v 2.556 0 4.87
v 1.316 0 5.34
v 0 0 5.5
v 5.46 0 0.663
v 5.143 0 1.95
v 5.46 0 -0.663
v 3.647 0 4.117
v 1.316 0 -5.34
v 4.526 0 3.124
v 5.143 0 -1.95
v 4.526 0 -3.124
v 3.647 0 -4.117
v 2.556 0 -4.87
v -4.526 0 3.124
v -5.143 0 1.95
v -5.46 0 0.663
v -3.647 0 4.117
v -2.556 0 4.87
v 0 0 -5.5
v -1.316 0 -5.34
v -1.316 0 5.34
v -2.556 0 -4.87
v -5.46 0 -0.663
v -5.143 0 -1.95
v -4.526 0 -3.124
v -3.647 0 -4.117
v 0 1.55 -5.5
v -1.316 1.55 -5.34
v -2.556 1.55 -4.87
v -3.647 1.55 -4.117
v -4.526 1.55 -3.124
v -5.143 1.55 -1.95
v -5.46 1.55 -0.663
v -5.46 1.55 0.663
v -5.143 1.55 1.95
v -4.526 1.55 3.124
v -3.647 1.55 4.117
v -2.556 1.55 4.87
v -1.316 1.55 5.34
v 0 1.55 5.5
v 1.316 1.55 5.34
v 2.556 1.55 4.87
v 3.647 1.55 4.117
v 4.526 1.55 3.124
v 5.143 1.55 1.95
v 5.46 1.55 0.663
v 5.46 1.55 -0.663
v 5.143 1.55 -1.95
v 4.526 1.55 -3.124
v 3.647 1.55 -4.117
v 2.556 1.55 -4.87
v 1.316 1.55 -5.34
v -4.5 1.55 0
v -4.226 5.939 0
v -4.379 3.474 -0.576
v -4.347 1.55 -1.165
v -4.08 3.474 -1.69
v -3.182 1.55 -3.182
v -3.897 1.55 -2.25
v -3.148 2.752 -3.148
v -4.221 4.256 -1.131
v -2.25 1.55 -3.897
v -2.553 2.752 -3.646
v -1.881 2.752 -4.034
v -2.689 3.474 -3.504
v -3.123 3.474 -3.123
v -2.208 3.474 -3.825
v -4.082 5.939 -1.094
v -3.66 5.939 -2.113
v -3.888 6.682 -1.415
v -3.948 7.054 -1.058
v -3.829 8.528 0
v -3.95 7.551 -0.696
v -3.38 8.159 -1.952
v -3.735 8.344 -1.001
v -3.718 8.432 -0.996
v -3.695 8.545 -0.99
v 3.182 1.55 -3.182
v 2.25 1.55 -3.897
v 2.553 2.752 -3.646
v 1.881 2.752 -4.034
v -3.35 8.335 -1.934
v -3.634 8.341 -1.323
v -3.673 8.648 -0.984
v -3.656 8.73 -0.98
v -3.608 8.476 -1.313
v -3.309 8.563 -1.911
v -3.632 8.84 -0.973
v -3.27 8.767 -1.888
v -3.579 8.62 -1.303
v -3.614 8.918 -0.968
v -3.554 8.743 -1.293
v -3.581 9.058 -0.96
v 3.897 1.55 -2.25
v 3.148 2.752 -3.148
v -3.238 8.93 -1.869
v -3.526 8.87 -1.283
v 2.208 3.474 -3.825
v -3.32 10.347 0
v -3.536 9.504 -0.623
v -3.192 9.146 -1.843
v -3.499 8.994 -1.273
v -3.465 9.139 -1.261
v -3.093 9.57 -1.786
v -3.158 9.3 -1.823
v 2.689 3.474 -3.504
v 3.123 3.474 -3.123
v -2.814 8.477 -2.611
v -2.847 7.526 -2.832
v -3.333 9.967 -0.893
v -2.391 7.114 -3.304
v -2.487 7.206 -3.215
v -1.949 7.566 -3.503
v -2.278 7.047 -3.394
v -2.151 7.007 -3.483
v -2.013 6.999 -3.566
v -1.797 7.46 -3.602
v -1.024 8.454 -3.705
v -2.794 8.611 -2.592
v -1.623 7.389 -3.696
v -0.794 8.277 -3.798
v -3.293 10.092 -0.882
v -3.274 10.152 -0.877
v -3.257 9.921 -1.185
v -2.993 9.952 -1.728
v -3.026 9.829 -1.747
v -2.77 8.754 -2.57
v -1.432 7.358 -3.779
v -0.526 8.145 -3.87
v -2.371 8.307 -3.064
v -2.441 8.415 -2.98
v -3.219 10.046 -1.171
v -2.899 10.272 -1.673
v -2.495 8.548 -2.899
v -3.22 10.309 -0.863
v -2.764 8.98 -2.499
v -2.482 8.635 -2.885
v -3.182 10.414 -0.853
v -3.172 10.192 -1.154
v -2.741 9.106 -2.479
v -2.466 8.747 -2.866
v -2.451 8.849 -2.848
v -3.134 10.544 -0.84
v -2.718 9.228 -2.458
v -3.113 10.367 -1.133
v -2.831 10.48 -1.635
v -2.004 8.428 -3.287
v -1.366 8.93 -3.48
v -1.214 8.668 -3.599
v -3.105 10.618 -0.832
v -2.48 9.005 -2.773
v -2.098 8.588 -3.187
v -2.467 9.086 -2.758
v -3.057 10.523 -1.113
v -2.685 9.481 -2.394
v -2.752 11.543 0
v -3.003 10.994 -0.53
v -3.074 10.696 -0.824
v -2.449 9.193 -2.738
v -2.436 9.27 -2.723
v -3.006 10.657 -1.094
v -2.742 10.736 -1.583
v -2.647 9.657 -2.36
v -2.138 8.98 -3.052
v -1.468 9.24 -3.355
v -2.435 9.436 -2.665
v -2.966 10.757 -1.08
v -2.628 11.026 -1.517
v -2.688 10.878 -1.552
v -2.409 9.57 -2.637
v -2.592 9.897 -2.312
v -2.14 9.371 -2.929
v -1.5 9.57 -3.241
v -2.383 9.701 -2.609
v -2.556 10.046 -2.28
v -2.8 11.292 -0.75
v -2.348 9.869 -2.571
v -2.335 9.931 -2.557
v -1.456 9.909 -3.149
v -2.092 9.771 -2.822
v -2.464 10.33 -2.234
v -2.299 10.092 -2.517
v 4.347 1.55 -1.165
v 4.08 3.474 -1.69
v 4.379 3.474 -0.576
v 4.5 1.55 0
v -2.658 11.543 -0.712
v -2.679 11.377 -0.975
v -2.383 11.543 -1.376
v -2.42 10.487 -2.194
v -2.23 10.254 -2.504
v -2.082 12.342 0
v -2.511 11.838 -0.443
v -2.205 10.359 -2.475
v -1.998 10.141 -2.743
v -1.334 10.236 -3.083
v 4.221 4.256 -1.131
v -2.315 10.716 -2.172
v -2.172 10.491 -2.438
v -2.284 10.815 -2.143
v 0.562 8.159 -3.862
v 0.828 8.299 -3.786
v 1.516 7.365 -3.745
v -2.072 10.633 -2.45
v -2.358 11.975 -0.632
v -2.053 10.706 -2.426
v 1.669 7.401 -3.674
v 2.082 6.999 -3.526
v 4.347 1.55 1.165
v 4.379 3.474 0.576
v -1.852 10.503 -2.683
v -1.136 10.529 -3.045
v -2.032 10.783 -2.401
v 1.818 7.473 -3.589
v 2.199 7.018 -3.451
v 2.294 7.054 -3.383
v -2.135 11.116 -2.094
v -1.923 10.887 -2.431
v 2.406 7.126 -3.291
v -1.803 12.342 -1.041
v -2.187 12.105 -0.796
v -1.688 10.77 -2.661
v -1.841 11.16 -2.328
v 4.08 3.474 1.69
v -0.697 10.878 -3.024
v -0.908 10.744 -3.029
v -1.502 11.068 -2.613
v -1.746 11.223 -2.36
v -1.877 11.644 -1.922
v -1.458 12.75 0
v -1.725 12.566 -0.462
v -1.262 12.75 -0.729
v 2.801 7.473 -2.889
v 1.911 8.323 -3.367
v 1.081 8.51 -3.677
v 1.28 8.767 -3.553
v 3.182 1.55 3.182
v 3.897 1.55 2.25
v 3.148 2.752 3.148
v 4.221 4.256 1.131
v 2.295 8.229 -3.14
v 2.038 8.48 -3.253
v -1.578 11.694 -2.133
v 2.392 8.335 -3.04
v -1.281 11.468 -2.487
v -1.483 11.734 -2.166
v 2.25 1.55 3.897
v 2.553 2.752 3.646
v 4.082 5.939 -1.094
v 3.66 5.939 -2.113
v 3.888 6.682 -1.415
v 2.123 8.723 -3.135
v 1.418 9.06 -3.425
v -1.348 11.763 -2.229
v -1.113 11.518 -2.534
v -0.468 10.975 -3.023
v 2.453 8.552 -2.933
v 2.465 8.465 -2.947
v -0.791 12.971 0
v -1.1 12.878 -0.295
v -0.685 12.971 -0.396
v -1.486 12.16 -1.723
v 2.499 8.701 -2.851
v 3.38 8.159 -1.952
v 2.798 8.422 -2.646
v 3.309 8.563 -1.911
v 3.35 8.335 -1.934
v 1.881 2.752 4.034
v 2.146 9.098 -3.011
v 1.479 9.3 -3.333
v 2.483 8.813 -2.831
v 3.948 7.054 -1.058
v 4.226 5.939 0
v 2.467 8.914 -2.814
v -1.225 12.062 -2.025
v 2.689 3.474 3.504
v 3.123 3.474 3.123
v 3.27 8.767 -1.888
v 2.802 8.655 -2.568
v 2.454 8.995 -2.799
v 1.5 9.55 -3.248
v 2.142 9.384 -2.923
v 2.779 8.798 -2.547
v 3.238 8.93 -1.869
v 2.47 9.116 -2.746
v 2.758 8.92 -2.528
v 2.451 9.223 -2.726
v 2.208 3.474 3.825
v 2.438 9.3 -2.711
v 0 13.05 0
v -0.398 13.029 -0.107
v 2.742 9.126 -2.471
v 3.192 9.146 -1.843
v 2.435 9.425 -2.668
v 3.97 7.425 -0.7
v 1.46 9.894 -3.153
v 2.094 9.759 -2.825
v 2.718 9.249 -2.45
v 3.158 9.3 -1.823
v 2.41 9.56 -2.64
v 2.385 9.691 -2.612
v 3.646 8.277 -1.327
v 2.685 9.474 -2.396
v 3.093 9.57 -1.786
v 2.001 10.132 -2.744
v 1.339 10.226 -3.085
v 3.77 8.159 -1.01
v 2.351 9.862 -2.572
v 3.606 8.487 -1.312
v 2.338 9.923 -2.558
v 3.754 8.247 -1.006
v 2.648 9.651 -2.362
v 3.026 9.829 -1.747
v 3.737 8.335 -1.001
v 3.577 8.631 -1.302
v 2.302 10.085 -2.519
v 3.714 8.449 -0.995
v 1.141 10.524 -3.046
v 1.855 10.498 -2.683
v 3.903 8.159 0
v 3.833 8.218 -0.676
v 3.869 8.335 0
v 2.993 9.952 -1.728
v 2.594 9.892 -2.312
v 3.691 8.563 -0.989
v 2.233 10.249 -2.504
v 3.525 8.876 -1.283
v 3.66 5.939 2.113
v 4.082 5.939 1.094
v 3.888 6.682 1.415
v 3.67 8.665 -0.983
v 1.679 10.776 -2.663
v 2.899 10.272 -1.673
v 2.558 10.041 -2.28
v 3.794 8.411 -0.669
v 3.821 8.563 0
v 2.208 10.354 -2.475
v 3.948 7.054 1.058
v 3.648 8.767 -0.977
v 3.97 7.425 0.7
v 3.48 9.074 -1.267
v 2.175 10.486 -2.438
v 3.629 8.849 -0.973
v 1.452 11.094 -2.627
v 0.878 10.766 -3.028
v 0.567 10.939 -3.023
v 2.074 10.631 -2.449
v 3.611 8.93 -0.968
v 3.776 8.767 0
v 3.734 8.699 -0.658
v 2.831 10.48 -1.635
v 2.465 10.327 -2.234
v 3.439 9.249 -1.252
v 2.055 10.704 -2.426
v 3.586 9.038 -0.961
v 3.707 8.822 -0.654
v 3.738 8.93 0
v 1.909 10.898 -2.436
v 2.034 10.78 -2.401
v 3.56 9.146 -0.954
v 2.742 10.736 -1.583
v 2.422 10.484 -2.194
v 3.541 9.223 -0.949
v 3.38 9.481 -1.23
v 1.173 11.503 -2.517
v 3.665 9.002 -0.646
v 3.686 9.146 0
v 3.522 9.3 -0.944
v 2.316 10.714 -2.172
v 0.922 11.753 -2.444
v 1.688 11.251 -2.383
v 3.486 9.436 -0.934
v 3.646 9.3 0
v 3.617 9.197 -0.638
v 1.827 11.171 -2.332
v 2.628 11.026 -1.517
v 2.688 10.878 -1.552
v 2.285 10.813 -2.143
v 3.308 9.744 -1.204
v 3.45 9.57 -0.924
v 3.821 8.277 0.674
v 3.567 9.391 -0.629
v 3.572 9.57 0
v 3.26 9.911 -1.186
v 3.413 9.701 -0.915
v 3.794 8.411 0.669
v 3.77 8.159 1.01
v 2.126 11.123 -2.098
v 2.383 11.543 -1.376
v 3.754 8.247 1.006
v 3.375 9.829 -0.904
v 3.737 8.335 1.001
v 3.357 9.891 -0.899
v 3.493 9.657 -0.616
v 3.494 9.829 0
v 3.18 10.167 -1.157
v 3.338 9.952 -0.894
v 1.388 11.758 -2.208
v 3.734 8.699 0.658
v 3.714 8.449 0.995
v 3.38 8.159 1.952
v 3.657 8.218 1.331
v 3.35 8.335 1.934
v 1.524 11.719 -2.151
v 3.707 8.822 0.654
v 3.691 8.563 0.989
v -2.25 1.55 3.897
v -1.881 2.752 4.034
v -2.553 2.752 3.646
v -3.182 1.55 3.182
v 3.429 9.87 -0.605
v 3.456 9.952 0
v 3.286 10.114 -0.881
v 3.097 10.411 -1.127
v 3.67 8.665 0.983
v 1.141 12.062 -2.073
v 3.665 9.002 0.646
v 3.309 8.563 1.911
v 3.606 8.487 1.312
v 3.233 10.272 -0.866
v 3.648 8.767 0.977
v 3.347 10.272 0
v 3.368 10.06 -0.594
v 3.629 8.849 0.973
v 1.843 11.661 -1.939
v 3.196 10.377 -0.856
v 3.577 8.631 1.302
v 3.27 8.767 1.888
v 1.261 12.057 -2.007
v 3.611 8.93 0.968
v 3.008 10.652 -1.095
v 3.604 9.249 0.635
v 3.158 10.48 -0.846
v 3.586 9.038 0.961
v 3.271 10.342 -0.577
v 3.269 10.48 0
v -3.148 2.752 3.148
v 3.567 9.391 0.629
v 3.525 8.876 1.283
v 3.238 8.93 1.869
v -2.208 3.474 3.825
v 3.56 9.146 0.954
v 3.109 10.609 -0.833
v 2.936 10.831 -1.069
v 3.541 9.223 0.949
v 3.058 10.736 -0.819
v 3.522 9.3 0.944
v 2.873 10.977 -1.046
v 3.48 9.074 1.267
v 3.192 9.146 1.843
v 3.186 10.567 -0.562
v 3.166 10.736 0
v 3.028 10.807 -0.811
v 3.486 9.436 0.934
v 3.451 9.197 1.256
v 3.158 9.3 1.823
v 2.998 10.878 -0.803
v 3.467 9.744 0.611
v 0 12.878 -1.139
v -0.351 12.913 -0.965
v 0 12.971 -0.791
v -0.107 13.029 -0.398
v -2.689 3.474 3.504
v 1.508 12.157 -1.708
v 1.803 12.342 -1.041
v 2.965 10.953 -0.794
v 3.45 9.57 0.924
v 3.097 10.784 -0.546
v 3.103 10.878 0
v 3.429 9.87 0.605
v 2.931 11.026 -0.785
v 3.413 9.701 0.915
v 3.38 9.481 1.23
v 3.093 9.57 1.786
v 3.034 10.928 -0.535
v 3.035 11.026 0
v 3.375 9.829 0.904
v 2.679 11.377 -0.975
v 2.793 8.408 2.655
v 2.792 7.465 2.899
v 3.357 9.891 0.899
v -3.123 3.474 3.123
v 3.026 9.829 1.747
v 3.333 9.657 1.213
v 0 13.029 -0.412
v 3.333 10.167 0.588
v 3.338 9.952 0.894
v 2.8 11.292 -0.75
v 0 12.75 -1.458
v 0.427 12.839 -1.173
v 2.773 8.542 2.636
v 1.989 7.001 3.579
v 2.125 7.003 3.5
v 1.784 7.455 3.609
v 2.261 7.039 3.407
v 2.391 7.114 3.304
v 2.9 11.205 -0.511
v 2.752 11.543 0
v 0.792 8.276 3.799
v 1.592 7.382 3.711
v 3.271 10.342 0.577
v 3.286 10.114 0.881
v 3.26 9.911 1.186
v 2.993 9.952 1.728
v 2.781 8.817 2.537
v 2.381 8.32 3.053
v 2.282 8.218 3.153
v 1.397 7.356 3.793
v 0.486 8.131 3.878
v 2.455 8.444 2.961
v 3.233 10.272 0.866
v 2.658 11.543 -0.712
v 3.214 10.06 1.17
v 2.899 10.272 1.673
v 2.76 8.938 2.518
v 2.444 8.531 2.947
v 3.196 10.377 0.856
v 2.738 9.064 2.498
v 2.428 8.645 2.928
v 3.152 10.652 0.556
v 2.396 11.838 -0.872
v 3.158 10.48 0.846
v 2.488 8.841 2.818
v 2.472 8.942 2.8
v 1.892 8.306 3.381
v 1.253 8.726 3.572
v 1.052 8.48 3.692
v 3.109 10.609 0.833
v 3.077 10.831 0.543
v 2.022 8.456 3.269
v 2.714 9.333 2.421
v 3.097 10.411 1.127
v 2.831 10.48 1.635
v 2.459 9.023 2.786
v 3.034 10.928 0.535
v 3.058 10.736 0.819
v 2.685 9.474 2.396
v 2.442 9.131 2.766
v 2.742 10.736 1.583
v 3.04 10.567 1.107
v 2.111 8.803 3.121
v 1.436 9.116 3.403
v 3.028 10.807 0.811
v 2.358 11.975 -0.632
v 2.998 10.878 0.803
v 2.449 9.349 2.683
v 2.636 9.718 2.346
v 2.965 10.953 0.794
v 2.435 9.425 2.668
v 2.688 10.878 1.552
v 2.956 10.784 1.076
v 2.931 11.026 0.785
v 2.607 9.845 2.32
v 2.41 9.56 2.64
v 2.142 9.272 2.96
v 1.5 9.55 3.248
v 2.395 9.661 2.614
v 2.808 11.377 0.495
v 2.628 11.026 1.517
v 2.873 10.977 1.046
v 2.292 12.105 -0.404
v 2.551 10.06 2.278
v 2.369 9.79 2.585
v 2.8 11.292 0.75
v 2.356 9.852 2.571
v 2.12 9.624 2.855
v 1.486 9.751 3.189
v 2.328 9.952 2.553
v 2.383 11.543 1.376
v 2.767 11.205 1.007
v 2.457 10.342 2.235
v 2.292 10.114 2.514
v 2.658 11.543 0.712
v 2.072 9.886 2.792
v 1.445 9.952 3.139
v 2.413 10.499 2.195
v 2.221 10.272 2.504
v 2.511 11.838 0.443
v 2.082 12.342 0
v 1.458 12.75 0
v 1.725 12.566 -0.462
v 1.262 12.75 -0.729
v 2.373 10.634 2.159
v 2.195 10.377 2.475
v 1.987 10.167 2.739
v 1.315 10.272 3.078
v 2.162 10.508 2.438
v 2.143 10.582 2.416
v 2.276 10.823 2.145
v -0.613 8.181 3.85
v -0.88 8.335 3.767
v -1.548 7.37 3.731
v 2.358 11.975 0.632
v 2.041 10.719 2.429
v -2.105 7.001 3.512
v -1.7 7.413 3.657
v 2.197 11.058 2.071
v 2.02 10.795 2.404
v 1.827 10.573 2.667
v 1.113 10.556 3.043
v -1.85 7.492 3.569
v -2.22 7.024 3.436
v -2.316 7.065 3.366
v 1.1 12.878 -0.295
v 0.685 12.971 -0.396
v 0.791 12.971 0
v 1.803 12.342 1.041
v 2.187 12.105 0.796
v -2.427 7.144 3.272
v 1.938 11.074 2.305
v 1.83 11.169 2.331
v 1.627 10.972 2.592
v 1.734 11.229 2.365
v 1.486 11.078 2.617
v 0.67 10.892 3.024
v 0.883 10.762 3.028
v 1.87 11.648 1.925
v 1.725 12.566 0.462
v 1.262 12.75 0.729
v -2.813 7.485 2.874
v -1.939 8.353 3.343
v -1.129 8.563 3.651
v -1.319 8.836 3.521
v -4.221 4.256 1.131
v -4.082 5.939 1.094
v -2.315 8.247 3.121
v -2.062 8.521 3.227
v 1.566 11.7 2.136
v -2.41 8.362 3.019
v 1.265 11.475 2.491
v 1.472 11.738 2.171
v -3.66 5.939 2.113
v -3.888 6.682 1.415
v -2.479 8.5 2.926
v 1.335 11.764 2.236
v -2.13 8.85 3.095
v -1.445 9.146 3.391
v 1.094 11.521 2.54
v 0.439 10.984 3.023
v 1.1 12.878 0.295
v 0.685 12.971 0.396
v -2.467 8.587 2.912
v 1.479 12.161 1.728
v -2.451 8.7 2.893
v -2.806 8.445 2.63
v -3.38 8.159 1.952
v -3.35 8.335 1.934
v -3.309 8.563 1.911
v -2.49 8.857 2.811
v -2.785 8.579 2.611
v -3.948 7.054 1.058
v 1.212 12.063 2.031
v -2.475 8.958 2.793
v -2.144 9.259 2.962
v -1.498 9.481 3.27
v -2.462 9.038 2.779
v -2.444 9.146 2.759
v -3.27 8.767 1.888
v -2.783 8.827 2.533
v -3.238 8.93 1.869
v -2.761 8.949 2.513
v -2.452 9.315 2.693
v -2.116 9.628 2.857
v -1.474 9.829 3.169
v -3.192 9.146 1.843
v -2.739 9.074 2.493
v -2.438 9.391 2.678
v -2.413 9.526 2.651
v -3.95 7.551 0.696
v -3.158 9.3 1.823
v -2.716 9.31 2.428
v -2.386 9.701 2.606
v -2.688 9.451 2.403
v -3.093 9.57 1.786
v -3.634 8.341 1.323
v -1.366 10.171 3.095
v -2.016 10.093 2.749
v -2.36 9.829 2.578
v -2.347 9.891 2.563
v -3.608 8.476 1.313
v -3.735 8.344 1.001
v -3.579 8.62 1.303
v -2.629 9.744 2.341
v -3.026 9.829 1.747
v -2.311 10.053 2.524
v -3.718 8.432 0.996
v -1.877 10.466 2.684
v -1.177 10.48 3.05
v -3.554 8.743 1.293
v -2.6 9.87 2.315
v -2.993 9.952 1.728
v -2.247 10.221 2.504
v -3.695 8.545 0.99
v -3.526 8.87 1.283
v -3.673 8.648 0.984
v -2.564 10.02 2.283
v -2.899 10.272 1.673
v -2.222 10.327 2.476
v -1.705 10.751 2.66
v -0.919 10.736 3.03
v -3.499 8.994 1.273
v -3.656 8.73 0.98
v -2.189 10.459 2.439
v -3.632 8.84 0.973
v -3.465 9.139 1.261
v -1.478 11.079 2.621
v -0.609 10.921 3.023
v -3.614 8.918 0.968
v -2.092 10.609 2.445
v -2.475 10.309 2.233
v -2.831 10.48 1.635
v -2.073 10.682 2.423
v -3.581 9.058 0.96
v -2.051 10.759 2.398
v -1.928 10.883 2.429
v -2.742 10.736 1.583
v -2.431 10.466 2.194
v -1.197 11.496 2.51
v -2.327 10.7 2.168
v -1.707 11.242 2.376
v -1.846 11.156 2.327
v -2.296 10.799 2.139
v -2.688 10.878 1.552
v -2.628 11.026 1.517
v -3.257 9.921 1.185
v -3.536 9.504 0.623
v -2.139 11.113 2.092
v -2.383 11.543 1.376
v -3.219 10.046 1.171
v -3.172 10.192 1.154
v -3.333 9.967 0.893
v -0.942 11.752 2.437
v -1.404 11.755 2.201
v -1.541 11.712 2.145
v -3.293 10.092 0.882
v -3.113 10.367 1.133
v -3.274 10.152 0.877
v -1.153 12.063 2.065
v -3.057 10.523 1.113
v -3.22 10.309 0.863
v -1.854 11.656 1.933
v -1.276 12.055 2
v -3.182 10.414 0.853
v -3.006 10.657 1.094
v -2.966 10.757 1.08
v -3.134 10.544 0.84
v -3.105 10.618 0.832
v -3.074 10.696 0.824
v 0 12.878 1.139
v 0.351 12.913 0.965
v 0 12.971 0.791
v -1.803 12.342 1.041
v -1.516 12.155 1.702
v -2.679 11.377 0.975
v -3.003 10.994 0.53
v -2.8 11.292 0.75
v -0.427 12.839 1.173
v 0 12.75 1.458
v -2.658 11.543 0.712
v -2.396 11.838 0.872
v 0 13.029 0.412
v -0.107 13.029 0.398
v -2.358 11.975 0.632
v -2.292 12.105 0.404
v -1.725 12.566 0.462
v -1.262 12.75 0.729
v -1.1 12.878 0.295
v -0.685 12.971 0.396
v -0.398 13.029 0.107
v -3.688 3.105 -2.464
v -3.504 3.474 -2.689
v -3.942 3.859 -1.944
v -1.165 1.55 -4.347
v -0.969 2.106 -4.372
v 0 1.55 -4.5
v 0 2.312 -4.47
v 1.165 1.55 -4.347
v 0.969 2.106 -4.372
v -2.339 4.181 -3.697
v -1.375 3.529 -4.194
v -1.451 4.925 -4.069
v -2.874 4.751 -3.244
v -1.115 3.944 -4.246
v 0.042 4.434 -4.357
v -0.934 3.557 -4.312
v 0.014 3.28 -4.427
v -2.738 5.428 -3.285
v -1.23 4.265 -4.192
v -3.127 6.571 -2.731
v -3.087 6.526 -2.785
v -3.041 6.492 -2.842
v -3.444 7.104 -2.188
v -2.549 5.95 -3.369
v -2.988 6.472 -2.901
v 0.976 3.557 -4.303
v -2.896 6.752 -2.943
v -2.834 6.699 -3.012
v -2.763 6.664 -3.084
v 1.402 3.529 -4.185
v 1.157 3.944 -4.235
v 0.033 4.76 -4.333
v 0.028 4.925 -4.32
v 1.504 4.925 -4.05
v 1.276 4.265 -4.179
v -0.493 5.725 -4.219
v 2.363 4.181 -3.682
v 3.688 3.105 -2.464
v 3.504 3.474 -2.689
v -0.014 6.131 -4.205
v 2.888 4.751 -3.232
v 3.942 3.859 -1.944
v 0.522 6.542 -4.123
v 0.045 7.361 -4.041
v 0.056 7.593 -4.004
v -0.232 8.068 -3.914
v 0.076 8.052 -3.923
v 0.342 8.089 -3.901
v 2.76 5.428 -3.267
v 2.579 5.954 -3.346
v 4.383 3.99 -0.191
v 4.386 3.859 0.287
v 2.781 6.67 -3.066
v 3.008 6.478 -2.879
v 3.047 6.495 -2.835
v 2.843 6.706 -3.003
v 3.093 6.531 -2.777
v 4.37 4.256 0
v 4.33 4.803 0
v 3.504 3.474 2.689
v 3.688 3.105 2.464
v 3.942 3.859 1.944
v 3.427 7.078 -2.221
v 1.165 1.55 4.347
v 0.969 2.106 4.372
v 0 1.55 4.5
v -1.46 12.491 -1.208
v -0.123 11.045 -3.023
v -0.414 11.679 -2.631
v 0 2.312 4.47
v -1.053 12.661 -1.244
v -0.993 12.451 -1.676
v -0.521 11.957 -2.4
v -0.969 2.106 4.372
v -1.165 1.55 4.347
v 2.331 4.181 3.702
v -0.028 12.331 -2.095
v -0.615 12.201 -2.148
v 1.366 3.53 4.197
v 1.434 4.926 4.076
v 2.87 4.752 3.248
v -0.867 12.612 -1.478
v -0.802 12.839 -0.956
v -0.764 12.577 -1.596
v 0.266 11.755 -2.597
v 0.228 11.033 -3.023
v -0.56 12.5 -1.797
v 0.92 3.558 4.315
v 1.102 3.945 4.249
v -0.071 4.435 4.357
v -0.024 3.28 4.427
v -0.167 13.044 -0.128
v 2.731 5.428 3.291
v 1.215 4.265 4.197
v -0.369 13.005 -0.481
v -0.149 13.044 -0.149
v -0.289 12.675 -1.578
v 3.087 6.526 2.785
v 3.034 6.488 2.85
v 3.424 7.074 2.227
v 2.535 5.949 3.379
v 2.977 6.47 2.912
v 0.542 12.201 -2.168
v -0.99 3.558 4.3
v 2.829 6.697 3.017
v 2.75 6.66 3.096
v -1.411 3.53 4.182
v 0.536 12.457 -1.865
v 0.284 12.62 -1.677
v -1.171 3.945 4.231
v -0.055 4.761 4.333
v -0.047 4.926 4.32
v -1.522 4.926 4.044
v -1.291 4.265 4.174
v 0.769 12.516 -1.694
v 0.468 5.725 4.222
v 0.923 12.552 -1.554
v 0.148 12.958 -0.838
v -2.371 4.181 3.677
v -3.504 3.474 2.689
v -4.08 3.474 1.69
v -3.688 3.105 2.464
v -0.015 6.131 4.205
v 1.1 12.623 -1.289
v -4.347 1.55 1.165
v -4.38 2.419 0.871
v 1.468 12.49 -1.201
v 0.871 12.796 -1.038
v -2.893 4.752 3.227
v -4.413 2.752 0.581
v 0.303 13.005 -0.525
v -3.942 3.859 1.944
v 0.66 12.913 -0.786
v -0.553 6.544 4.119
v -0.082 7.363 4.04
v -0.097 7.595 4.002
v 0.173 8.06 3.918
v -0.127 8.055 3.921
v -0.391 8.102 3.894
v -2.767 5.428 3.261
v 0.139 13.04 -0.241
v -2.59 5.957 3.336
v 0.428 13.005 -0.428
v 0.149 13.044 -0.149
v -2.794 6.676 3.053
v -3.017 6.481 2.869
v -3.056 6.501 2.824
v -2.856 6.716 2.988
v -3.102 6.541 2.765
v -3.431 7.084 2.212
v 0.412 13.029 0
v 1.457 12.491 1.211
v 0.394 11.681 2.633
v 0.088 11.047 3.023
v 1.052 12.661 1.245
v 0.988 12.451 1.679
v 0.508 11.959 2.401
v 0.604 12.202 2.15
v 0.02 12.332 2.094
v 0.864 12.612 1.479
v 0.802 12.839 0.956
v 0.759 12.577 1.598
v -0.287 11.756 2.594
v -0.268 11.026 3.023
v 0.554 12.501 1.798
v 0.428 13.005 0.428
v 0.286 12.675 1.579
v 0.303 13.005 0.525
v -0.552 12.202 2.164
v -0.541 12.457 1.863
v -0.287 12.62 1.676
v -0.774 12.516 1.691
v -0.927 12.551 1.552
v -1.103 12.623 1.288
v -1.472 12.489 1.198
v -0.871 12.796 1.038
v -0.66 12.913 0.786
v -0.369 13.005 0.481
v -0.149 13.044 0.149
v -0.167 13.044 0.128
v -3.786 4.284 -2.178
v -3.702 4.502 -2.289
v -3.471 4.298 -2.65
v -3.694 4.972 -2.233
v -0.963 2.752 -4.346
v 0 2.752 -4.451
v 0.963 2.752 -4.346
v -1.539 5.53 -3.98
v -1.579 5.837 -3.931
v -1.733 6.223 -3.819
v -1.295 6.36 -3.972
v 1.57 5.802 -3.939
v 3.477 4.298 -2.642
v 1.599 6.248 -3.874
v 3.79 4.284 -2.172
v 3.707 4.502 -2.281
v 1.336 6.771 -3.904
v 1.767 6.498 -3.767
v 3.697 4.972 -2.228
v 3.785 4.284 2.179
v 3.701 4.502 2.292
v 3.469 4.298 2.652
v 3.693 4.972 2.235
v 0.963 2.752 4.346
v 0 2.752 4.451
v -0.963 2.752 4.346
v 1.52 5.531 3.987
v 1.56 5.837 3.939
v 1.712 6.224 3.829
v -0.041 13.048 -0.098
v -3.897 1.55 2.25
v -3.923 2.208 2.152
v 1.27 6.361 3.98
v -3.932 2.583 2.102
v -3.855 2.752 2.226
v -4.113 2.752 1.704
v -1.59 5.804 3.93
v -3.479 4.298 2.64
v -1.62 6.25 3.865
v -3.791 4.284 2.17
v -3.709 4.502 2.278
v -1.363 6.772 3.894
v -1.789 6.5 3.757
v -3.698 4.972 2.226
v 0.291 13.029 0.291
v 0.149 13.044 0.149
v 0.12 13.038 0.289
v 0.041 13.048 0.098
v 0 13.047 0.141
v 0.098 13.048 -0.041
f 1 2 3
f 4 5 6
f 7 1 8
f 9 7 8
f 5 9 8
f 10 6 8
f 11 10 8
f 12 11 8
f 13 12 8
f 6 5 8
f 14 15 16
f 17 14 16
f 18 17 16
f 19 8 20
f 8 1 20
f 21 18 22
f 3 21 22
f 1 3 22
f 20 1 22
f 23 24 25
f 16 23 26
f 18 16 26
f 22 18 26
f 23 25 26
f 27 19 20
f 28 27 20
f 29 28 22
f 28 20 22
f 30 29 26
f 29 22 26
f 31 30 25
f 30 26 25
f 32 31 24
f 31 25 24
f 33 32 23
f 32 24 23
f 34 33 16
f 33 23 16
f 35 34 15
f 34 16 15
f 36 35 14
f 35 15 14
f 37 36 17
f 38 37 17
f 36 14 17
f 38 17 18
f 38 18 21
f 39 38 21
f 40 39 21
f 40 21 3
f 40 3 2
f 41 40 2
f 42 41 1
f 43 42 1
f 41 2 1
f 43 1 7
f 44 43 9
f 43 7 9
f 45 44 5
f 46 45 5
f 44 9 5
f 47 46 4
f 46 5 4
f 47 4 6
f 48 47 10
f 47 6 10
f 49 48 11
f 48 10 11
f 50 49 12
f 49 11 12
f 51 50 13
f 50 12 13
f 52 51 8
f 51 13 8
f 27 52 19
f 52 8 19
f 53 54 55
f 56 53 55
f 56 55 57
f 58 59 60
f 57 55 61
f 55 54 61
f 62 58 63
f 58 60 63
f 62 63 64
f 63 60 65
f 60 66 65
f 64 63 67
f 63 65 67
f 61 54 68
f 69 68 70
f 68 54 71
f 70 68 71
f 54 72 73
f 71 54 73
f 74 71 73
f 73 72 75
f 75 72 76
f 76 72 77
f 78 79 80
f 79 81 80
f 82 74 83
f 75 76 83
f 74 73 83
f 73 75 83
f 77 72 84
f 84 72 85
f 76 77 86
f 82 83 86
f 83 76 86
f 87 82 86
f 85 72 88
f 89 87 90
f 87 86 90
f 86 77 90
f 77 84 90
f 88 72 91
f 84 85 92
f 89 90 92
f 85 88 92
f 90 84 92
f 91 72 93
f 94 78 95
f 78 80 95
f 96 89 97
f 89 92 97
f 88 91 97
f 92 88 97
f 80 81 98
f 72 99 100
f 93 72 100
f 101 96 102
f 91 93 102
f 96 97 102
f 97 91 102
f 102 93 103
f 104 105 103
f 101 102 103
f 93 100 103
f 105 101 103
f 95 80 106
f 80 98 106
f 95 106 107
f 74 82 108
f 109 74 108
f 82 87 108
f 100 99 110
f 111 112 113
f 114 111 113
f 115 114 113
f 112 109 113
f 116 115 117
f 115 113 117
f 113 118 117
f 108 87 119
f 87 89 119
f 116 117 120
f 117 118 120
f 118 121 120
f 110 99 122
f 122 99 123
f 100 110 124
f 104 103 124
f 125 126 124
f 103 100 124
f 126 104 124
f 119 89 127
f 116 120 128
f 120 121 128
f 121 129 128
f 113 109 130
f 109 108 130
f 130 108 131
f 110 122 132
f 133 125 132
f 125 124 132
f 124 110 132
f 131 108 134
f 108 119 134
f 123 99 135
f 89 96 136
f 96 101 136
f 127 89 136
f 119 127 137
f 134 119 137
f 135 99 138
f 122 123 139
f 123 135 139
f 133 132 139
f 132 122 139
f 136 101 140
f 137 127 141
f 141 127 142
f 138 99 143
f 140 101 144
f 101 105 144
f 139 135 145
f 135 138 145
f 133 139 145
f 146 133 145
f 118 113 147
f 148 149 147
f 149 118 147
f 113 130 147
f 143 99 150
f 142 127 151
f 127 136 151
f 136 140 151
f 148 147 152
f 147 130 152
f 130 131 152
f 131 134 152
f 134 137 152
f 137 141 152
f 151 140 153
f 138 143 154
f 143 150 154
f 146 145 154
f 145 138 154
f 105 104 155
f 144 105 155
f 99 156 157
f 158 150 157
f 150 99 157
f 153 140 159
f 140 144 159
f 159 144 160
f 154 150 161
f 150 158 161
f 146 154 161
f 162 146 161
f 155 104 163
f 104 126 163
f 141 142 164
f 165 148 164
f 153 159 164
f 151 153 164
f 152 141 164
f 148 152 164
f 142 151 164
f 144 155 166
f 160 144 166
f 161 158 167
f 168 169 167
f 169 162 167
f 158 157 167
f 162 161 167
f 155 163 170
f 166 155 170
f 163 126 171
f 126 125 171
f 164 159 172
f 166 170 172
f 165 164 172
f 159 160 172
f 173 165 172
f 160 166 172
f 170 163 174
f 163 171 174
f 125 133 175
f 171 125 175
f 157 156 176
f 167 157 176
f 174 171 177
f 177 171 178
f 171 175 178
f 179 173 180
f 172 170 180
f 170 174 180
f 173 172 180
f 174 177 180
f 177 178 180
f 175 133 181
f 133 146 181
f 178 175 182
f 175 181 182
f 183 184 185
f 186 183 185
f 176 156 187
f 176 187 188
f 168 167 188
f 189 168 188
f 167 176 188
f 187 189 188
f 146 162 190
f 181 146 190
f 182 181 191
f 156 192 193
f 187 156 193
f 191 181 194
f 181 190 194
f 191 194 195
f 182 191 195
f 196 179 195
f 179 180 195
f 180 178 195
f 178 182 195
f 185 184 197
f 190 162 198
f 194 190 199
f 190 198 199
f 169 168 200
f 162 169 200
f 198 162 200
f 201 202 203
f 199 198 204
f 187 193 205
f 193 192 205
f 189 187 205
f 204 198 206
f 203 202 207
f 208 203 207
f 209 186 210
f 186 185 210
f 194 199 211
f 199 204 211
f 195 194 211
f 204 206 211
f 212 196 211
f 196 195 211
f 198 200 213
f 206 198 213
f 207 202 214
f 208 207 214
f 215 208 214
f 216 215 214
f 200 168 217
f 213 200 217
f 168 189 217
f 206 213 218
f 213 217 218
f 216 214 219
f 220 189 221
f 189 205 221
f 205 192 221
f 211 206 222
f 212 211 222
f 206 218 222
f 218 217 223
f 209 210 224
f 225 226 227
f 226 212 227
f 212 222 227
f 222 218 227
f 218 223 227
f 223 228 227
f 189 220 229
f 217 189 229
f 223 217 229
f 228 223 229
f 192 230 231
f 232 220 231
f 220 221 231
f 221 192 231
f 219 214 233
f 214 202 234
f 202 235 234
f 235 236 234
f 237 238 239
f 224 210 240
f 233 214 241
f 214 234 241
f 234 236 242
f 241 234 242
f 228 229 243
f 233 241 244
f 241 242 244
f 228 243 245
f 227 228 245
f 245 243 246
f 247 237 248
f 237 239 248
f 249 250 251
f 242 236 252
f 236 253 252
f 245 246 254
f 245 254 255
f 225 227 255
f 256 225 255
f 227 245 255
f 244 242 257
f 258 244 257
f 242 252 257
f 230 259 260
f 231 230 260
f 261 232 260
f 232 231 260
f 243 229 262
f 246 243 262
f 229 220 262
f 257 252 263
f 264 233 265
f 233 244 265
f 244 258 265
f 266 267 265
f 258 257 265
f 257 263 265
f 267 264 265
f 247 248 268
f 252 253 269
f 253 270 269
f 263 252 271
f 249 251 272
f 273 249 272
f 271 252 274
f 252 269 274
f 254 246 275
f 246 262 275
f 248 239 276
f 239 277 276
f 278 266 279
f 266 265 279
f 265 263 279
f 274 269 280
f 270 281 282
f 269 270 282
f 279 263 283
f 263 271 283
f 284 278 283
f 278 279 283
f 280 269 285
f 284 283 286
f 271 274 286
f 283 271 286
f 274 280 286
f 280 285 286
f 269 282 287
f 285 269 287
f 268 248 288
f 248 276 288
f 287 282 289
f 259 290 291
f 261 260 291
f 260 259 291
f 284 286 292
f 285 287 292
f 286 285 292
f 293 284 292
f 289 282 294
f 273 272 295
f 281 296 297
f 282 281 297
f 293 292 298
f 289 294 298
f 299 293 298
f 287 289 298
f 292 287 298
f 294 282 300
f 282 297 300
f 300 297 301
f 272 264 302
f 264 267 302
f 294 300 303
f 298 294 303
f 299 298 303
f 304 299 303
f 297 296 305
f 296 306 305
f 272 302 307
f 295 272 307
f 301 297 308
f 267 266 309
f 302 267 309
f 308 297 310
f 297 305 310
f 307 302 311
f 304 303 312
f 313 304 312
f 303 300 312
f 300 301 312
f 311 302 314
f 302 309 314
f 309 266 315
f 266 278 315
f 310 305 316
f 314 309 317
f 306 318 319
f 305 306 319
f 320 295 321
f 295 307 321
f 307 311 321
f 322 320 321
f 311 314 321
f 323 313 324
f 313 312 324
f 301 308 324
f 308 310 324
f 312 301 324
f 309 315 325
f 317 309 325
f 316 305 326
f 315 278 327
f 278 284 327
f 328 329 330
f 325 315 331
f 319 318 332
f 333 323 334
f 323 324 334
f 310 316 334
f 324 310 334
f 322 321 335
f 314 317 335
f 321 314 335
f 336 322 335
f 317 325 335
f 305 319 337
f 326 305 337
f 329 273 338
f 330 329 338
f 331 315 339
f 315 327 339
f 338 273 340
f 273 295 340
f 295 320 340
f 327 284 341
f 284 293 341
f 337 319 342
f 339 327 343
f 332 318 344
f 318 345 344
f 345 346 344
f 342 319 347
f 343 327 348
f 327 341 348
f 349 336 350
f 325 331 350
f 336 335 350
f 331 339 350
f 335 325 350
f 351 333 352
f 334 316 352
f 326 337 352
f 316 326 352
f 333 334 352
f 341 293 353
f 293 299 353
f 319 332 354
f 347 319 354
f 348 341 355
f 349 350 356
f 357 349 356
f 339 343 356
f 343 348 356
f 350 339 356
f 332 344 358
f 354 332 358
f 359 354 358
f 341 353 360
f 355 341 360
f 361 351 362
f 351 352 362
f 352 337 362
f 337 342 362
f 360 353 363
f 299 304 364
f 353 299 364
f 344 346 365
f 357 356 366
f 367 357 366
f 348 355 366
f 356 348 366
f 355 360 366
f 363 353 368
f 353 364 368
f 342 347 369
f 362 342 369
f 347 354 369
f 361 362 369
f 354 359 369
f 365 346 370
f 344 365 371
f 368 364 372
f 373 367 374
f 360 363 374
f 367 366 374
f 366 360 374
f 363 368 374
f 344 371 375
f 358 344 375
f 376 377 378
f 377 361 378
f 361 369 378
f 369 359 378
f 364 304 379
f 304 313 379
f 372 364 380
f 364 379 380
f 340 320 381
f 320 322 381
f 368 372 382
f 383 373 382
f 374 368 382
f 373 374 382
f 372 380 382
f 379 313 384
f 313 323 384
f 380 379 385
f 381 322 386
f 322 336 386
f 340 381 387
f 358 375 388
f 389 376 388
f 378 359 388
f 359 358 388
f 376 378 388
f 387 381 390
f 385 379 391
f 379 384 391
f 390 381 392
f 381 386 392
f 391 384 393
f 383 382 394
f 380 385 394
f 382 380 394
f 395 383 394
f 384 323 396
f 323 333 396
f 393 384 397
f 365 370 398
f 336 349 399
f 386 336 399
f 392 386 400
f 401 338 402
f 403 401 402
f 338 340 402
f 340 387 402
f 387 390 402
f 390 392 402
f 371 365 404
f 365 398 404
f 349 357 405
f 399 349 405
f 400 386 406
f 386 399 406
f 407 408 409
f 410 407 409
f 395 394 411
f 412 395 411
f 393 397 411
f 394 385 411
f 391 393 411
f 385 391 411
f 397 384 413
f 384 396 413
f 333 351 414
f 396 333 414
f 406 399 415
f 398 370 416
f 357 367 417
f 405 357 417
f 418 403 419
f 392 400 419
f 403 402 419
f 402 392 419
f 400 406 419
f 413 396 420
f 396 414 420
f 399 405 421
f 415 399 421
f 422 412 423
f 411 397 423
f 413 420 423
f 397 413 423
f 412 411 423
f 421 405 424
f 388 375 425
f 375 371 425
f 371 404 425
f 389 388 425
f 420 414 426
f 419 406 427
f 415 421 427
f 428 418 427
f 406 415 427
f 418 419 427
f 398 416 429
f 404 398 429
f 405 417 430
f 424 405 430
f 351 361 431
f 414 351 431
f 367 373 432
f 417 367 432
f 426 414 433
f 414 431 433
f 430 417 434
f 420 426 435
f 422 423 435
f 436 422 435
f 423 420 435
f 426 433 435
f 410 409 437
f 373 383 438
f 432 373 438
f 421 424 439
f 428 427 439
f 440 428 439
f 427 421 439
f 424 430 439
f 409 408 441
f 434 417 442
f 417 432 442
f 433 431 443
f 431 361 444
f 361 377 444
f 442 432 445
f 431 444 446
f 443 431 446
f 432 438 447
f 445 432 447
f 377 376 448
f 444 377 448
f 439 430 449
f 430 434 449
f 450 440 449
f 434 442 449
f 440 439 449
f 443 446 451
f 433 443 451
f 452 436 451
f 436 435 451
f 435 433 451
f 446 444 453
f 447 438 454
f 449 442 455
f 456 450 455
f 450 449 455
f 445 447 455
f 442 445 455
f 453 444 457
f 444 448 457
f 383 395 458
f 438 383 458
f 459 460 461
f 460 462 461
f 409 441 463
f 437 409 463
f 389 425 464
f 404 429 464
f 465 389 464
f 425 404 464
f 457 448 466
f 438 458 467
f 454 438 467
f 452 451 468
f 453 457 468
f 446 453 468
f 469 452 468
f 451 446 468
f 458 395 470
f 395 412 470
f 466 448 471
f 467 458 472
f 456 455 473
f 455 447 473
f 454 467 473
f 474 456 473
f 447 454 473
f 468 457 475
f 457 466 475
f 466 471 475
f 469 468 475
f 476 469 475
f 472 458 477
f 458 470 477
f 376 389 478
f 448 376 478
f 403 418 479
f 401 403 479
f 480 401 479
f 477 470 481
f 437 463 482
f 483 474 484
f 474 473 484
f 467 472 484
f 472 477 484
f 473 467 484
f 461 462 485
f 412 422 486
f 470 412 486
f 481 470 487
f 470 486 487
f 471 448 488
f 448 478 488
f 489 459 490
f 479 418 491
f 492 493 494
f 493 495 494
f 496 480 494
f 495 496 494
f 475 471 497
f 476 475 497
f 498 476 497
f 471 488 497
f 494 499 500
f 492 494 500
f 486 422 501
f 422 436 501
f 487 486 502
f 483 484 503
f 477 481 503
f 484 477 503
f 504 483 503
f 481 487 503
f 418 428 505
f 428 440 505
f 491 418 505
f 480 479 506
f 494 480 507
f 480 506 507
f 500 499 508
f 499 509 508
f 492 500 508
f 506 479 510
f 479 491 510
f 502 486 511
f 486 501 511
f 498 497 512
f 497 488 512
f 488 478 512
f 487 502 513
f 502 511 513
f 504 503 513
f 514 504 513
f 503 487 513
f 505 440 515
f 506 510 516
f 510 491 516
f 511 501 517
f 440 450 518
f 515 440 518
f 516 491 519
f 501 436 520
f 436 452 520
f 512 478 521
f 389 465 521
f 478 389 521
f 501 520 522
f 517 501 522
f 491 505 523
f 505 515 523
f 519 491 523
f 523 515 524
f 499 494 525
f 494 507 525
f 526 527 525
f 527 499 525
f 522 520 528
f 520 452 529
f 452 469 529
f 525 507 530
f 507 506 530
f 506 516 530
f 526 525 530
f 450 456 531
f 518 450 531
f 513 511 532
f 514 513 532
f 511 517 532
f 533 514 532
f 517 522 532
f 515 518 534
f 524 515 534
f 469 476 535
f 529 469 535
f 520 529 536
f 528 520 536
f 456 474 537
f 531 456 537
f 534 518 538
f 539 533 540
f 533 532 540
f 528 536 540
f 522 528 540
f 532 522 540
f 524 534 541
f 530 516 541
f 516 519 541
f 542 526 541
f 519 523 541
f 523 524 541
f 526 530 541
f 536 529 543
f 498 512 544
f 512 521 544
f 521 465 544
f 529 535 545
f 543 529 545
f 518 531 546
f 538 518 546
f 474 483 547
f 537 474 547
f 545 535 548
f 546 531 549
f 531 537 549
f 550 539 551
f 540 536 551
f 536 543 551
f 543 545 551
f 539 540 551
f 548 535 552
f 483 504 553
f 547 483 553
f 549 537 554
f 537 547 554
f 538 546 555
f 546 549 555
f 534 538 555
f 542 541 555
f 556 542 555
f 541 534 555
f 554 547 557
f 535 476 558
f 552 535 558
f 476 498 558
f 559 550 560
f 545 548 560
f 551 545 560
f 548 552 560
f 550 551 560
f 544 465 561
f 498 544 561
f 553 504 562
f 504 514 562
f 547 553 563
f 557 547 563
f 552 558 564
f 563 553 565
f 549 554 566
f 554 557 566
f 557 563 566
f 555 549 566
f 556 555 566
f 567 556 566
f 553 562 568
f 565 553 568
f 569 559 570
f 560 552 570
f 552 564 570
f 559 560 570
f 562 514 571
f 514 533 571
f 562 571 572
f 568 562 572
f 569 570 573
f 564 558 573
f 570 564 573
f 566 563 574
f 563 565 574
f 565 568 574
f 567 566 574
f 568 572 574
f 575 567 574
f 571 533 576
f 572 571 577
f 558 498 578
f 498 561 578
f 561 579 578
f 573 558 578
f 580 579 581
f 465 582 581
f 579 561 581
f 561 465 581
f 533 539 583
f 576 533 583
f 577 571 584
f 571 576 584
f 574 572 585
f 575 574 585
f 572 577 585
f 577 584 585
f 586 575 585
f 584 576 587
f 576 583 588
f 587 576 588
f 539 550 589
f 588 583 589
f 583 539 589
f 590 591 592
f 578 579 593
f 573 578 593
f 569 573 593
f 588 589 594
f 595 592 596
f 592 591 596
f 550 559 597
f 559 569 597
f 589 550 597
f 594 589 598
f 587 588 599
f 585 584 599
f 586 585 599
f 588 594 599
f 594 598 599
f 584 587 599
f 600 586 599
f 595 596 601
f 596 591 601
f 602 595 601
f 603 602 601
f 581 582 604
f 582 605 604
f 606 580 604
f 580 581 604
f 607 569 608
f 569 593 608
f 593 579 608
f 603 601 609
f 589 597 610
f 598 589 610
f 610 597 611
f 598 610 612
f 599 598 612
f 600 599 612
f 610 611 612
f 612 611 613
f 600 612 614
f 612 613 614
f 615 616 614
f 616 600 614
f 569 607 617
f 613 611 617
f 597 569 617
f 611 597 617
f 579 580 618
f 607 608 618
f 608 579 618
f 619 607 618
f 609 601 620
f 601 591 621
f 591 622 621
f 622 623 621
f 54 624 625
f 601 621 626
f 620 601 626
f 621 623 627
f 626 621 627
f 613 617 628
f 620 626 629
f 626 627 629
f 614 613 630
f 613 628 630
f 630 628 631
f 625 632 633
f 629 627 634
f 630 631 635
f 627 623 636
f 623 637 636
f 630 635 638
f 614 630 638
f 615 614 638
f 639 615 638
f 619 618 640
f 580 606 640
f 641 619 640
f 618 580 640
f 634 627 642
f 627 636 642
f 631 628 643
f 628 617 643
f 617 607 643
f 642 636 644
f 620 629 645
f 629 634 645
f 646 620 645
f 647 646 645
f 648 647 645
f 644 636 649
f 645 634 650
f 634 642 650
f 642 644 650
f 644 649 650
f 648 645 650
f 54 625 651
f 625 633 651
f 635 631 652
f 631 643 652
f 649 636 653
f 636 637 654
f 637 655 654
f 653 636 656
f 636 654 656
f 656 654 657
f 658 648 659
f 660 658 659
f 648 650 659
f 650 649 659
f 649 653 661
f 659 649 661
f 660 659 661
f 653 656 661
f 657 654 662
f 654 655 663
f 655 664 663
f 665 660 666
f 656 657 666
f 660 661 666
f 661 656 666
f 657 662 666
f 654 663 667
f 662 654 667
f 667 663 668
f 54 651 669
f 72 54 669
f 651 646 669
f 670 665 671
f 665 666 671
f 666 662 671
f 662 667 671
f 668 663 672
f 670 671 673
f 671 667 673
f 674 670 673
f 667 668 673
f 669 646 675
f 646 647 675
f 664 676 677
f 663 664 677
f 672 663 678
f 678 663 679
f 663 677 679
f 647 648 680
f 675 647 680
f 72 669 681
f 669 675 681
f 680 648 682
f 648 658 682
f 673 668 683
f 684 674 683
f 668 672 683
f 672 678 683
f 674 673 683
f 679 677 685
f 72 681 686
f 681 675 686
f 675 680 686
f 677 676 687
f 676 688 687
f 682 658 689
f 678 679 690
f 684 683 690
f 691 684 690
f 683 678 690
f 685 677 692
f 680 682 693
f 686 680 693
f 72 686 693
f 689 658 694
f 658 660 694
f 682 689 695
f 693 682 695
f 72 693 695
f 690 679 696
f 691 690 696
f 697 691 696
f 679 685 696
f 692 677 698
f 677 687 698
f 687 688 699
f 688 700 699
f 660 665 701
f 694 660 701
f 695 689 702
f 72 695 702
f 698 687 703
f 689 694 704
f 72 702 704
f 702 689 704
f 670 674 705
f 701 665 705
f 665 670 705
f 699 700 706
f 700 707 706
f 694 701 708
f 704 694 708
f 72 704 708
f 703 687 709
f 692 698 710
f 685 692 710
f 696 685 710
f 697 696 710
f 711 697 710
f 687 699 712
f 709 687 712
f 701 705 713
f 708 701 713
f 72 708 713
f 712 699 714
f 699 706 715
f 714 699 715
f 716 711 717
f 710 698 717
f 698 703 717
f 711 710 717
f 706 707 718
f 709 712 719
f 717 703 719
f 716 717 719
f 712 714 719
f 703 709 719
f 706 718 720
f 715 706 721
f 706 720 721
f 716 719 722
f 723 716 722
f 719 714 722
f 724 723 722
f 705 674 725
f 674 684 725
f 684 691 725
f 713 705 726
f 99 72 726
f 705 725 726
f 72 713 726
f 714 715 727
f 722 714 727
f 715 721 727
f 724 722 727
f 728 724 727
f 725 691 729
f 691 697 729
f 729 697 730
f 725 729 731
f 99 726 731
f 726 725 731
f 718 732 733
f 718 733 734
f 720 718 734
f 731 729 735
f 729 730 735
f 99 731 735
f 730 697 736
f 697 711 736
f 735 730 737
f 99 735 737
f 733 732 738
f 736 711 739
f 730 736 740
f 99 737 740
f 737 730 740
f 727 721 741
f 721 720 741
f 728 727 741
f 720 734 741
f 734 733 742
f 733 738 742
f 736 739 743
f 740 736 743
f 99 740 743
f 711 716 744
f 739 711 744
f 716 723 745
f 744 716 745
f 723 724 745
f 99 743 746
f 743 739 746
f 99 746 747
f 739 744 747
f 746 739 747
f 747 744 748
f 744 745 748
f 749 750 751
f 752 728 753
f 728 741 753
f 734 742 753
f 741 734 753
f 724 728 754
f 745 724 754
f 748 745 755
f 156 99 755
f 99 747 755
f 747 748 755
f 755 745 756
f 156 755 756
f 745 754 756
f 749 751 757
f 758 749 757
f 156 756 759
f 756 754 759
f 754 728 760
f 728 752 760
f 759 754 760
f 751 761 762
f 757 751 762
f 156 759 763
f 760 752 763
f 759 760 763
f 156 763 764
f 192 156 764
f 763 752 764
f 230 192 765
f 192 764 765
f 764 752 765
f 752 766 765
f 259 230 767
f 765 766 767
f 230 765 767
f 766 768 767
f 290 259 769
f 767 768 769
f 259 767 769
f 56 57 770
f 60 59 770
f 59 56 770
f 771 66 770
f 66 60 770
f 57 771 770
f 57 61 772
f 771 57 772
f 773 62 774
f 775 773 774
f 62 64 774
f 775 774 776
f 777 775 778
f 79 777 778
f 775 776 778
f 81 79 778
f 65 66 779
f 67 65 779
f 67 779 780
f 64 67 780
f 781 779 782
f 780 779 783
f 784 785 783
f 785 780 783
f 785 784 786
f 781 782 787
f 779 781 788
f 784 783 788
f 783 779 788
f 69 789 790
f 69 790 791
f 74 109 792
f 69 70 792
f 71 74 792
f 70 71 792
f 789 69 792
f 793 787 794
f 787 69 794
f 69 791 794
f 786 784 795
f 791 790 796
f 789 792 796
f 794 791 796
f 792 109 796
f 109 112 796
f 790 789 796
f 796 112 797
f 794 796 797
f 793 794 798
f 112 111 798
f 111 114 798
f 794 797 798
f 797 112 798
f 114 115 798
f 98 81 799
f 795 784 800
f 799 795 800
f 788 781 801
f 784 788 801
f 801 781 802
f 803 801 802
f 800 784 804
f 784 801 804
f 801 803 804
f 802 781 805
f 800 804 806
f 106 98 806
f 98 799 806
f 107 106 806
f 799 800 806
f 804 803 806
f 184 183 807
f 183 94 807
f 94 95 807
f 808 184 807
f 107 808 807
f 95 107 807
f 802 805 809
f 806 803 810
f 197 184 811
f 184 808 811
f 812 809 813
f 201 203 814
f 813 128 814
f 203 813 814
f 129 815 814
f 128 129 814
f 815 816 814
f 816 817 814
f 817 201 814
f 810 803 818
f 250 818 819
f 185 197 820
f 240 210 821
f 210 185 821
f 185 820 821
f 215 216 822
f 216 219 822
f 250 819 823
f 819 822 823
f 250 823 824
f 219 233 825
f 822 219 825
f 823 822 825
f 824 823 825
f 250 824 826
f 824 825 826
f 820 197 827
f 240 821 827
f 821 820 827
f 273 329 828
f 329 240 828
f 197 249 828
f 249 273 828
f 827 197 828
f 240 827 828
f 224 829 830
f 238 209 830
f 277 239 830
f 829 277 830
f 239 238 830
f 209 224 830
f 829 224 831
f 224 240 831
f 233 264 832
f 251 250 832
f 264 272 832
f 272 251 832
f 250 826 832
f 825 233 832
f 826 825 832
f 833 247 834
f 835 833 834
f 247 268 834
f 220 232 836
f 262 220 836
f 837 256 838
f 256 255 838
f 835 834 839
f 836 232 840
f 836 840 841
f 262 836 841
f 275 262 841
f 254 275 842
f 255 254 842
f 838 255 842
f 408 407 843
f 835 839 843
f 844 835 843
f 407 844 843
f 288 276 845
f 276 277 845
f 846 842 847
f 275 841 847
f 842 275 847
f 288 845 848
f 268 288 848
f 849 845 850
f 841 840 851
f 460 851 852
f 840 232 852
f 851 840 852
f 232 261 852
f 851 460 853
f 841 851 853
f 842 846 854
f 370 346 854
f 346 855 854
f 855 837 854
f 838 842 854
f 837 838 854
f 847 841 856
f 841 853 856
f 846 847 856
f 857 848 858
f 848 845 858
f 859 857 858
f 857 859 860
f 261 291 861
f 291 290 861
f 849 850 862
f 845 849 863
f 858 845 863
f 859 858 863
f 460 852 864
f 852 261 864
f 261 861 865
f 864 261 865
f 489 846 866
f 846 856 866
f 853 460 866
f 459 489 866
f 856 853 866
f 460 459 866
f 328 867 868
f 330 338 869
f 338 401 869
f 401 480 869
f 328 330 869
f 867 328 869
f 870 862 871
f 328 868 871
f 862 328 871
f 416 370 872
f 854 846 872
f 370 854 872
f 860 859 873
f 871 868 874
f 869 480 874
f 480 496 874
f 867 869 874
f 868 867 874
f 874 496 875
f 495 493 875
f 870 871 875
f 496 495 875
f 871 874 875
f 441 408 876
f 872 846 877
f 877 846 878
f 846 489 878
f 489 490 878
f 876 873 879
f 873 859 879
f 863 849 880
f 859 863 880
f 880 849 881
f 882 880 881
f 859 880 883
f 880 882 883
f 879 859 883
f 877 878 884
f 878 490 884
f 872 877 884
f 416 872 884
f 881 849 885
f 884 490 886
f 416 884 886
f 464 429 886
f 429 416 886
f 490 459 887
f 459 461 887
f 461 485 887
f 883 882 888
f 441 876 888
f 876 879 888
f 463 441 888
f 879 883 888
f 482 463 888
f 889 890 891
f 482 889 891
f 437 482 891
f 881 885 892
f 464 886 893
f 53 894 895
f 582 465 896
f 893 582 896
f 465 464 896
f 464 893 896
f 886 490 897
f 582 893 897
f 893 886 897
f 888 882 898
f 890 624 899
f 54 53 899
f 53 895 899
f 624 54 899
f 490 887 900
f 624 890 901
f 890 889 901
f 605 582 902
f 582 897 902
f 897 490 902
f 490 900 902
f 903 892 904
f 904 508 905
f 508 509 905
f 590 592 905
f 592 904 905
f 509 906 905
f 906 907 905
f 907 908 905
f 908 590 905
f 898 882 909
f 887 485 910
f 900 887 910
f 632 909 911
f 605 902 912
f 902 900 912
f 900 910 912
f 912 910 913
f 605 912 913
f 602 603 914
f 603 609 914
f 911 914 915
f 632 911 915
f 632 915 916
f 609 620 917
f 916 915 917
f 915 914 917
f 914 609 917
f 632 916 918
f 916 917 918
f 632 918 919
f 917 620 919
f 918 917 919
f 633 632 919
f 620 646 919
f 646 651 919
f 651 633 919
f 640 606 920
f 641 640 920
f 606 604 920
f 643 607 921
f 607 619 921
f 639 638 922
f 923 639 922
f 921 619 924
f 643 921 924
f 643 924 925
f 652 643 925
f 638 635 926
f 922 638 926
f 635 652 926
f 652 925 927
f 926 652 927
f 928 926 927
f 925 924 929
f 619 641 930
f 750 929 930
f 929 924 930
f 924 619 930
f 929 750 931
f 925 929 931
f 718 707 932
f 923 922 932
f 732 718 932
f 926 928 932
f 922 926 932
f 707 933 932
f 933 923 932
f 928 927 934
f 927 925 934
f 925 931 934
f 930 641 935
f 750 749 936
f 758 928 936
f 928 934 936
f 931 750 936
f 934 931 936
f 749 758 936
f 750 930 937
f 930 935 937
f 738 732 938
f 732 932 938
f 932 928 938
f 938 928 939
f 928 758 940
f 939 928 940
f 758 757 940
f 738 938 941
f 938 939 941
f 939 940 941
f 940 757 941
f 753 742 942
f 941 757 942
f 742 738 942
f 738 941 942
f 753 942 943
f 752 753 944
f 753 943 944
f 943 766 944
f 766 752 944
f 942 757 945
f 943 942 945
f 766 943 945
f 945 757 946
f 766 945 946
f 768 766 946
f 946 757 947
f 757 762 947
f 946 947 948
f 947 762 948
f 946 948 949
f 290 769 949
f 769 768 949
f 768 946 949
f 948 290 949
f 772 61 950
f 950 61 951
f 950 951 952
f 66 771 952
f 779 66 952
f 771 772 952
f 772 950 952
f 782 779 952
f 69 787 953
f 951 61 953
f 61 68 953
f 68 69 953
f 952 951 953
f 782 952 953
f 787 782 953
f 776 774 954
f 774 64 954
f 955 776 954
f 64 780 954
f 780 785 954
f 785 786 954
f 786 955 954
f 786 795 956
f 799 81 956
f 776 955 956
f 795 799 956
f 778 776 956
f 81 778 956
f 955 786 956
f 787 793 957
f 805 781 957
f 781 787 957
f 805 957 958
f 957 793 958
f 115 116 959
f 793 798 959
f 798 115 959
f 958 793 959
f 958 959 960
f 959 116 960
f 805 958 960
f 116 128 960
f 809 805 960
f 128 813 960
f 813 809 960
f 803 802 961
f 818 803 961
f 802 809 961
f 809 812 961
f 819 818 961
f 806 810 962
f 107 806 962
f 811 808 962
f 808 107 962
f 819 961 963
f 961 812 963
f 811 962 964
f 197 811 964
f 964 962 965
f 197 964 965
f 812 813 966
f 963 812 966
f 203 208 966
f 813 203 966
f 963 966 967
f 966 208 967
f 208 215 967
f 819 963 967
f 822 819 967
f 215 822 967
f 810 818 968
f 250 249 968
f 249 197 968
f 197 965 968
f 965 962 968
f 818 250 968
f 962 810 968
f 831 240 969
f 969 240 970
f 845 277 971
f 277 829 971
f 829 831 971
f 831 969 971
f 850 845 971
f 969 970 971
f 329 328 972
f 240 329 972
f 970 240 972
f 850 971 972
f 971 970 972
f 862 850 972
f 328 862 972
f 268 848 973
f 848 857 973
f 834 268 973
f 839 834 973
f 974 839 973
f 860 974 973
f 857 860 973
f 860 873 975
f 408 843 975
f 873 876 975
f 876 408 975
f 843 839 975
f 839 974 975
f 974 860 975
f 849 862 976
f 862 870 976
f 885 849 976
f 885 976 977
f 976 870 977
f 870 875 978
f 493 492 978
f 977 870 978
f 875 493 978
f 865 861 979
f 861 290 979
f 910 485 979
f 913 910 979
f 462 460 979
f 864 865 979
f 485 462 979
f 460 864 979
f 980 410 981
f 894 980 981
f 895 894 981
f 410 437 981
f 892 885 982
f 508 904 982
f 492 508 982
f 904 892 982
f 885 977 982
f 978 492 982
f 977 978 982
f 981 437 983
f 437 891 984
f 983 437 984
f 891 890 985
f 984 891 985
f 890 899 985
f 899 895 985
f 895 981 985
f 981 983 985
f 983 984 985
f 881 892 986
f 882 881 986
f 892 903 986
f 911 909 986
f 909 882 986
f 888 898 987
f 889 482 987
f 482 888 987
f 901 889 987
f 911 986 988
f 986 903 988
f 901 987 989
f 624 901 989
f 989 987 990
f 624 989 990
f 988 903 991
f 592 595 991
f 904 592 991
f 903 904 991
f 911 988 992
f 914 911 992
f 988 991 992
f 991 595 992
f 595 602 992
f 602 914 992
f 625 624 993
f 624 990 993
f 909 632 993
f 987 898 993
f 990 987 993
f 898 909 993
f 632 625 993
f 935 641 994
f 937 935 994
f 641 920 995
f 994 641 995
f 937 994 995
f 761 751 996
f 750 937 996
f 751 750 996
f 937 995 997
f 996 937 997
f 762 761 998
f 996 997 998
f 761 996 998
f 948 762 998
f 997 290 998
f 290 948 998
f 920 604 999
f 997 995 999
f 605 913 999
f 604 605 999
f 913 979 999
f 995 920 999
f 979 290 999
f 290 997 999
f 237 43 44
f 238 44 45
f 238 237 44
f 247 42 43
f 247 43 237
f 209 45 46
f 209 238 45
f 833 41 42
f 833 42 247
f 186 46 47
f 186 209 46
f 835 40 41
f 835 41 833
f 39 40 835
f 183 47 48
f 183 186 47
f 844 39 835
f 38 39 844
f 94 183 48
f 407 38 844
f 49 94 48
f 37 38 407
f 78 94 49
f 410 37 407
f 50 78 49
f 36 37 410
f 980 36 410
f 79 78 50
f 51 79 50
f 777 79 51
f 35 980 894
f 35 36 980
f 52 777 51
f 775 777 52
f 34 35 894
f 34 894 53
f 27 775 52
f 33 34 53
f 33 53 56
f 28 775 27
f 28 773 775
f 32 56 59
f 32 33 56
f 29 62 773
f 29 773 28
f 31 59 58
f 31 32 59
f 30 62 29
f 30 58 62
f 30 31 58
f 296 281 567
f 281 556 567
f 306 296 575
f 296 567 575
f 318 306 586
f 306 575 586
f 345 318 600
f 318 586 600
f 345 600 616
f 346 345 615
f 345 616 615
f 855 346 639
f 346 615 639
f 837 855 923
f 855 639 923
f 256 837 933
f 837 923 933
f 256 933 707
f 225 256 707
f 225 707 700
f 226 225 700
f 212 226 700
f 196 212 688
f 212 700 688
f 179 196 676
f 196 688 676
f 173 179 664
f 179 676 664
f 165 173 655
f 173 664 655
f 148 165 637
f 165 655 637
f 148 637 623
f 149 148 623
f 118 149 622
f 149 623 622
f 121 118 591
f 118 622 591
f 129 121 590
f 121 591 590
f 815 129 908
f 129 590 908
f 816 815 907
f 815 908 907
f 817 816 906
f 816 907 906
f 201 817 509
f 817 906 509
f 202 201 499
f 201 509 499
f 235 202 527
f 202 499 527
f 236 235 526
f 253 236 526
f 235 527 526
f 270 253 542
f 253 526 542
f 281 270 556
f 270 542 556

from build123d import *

# Parameters (mm, degrees)
SKETCH1_R           = 5.5
BOSS_EXTRUDE1_DEPTH = 1.55
SKETCH2_R           = 4.5
BOSS_EXTRUDE2_DEPTH = 11.5
SKETCH4_R           = 1.5
CUT_EXTRUDE1_DEPTH  = 5


with BuildPart() as part:
    # Sketch1 → Boss-Extrude1 (new body)
    with BuildSketch(Plane(origin=(0, 0, 0), x_dir=(1, 0, 0), z_dir=(0, 1, 0))):
        Circle(SKETCH1_R)
    extrude(amount=BOSS_EXTRUDE1_DEPTH)

    # Sketch2 → Boss-Extrude2 (add)
    with BuildSketch(Plane(origin=(0, 1.55, 0), x_dir=(1, 0, 0), z_dir=(0, 1, 0))):
        Circle(SKETCH2_R)
    extrude(amount=BOSS_EXTRUDE2_DEPTH)

    # Sketch3 → Cut-Revolve7 (revolve, cut)
    with BuildSketch(Plane.XY):
        with BuildLine():
            Line((0, 13.05), (0, 13.379256314))
            Line((0, 13.379256314), (-5.06381538, 13.379256314))
            Line((-5.06381538, 13.379256314), (-5.06381538, 1.55))
            Line((-5.06381538, 1.55), (-4.5, 1.55))
            add(Edge.make_bspline(
                [(-4.5, 1.55), (-4.418212849, 3.533613751), (-4.258123849, 10.320482708), (-1.721394158, 13.043572847), (0, 13.05)],
                knots=[0, 0, 0, 0, 0.654562443, 1, 1, 1, 1], degree=3))
        make_face()
    revolve(axis=Axis((0, 13.7025, 0), (0, -1, 0)), mode=Mode.SUBTRACT)

    # Sketch4 → Cut-Extrude1 (cut, symmetric)
    with BuildSketch(Plane.XY):
        with Locations((0, 9.55)):
            Circle(SKETCH4_R)
    extrude(amount=CUT_EXTRUDE1_DEPTH, both=True, mode=Mode.SUBTRACT)


solid = part.part
